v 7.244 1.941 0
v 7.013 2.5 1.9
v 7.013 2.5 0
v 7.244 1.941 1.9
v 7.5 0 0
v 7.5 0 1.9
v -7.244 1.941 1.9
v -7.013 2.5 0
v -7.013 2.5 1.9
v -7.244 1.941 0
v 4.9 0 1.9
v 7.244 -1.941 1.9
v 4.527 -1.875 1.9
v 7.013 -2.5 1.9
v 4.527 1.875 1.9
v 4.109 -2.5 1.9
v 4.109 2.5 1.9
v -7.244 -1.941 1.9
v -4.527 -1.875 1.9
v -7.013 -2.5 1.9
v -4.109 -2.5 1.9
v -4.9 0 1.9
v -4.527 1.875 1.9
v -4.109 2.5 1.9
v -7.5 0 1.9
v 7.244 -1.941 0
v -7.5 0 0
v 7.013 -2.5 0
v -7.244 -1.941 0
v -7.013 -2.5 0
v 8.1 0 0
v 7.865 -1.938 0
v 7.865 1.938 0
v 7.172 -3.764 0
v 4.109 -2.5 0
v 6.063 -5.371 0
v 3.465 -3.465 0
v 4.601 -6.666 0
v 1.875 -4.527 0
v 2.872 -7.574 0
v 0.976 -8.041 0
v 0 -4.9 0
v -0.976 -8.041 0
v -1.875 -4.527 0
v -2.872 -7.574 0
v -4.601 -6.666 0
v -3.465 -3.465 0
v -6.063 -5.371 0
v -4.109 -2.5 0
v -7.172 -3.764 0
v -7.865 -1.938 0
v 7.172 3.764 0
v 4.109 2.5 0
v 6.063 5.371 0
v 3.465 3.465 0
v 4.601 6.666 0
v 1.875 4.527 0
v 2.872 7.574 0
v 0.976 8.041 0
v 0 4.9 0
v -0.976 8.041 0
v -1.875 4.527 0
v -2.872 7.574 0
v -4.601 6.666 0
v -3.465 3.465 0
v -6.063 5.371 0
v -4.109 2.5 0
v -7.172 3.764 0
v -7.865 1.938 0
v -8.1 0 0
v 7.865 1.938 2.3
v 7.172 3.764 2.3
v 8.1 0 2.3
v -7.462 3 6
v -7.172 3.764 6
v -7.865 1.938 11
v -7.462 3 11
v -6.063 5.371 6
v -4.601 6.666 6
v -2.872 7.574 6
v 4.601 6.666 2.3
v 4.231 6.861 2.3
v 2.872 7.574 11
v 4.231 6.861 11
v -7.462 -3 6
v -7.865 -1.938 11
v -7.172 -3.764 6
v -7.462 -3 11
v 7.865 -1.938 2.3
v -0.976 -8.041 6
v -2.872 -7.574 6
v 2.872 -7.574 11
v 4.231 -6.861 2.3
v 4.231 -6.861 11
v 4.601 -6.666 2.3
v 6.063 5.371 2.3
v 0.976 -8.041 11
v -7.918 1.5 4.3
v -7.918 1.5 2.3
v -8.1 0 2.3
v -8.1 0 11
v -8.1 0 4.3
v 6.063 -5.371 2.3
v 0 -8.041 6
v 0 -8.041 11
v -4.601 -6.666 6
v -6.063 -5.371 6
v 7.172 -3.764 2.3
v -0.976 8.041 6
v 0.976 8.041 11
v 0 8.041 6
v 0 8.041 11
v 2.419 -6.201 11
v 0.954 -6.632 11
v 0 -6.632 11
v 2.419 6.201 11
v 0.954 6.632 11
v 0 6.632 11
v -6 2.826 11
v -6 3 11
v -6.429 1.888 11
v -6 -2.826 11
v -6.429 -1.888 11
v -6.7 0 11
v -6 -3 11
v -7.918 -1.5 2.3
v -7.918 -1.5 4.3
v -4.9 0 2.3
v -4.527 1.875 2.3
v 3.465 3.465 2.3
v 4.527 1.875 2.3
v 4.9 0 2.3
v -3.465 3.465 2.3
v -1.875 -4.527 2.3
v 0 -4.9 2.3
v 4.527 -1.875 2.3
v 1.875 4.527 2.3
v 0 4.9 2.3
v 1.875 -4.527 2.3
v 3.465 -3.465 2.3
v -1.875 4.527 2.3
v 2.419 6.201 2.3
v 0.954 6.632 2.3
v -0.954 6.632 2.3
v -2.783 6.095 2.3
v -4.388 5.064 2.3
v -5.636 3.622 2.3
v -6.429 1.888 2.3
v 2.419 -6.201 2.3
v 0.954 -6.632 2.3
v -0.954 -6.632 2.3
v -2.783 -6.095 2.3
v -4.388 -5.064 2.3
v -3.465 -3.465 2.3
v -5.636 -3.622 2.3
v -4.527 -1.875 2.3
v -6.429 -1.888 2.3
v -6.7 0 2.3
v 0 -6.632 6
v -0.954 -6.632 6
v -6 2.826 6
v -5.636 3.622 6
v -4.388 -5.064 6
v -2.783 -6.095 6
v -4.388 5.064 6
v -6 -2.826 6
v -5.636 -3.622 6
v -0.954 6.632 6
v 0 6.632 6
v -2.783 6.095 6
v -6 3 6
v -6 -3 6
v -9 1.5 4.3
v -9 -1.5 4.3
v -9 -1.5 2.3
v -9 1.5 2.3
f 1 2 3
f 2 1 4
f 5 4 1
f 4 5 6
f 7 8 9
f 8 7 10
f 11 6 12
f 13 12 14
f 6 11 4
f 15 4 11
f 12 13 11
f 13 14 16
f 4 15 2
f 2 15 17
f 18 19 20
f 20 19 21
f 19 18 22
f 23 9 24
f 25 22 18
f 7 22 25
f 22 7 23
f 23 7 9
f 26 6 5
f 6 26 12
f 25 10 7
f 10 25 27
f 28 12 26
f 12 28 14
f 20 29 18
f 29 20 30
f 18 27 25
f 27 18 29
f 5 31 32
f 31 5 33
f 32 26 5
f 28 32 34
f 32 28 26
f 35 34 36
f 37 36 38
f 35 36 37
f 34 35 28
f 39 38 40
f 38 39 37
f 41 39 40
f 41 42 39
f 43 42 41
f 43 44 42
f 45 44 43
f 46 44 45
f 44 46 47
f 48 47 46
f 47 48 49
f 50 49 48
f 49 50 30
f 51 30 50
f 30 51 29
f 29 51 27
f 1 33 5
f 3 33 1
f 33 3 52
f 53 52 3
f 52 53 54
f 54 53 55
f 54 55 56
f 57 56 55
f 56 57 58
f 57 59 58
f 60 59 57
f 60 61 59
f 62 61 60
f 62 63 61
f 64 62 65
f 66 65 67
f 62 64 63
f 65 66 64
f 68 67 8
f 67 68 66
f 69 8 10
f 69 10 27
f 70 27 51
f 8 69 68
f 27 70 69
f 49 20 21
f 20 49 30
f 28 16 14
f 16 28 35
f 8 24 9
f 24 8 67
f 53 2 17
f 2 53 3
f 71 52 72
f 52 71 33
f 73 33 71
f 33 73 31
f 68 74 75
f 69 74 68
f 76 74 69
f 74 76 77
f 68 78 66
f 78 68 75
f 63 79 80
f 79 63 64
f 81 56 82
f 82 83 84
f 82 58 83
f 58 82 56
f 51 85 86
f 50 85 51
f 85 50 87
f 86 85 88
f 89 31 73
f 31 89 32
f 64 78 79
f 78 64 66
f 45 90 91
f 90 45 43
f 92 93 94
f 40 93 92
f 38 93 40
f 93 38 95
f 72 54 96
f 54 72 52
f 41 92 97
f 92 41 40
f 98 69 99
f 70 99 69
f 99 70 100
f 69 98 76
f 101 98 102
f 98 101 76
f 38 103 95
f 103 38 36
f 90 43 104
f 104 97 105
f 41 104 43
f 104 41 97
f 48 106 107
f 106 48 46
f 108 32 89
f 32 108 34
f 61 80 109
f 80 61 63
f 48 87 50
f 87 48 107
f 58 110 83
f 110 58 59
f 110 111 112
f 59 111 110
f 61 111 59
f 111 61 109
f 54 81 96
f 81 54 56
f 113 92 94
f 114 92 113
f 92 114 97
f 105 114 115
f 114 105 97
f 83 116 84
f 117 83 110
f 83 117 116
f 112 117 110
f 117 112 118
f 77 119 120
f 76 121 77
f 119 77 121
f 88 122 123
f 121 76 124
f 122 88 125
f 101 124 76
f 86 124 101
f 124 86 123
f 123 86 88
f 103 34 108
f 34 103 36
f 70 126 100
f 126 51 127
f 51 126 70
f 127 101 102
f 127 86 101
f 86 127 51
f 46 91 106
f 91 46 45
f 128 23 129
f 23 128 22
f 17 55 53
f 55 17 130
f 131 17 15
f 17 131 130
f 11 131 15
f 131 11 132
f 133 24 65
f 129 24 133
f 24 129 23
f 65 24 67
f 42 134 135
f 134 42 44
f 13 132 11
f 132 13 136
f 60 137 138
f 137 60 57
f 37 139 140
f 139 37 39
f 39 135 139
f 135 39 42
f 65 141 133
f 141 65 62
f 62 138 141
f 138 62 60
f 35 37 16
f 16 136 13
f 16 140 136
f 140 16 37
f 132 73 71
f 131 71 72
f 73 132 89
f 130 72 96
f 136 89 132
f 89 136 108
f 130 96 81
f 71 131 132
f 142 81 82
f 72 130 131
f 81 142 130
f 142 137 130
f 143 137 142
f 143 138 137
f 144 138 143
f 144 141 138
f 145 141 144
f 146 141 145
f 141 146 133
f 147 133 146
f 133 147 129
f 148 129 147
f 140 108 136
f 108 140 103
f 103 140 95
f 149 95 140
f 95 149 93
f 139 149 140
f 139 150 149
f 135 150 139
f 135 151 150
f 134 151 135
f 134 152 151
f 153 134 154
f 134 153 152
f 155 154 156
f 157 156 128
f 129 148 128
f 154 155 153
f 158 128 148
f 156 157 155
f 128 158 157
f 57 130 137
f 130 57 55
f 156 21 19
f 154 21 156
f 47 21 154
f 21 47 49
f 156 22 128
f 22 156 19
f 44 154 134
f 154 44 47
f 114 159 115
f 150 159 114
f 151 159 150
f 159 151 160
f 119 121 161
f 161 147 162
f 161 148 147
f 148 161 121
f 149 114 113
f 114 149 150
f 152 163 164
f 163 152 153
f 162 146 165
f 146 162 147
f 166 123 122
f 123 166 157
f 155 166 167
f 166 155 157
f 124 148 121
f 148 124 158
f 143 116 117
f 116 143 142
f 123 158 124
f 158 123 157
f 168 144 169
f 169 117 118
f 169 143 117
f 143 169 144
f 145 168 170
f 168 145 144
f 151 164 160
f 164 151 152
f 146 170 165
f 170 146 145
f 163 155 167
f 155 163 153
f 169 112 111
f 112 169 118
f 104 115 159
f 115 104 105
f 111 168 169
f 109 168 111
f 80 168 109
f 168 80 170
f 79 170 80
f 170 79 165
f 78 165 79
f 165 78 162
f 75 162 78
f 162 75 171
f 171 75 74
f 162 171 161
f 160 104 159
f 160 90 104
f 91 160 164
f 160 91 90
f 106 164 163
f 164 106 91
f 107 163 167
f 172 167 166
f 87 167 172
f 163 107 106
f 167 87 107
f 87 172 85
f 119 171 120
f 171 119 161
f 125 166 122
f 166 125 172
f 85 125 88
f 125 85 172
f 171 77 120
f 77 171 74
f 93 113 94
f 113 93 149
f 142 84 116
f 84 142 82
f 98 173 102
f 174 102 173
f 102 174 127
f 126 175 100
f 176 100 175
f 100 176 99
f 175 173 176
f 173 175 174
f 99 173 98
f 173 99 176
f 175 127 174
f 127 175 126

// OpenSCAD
//Insert from a 1990s - 2000s era VW door lock.
//As found in Polo 6Ns and contemporary cars.

difference(){
    cylinder(11,8.1,8.1); //outer cylinder
    cylinder(2.3,4.9,4.9); //hole in bottom flange for lock shaft
    translate([0,0,2.3]) cylinder(8.7,6.7,6.7); //hollow out leaving bottom flange
    translate([4.3,-8.1,2.3]) cube([4.3,16.2,8.7]); //large cut-out
    translate([-6,-8.1,6]) cube([6,16.2,5]); //cross-cut to make the two lugs
    translate([-8,-8.1,6]) cube([2,5.1,5]); //square off one side of the middle lug
    translate([-8,3,6]) cube([2,5.1,5]); //square off the other side of the middle lug
    rotate([0,0,-20]) translate([3,-5,2.3]) cube([5,2,8.7]); //shave off small lug corner 1
    mirror([0,1,0]) rotate([0,0,-20]) translate([3,-5,2.3]) cube([5,2,8.7]); //shave off small lug corner 2
    difference(){ //slot in underside
        cylinder(1.9,7.5,7.5);
        translate([-7.5,-7.5,0]) cube([15,5,1.9]);
        mirror([0,1,0]) translate([-7.5,-7.5,0]) cube([15,5,1.9]);
    }  
}

translate([-9,-1.5,2.3]) cube([1.2,3,2]); // rear protrusion
